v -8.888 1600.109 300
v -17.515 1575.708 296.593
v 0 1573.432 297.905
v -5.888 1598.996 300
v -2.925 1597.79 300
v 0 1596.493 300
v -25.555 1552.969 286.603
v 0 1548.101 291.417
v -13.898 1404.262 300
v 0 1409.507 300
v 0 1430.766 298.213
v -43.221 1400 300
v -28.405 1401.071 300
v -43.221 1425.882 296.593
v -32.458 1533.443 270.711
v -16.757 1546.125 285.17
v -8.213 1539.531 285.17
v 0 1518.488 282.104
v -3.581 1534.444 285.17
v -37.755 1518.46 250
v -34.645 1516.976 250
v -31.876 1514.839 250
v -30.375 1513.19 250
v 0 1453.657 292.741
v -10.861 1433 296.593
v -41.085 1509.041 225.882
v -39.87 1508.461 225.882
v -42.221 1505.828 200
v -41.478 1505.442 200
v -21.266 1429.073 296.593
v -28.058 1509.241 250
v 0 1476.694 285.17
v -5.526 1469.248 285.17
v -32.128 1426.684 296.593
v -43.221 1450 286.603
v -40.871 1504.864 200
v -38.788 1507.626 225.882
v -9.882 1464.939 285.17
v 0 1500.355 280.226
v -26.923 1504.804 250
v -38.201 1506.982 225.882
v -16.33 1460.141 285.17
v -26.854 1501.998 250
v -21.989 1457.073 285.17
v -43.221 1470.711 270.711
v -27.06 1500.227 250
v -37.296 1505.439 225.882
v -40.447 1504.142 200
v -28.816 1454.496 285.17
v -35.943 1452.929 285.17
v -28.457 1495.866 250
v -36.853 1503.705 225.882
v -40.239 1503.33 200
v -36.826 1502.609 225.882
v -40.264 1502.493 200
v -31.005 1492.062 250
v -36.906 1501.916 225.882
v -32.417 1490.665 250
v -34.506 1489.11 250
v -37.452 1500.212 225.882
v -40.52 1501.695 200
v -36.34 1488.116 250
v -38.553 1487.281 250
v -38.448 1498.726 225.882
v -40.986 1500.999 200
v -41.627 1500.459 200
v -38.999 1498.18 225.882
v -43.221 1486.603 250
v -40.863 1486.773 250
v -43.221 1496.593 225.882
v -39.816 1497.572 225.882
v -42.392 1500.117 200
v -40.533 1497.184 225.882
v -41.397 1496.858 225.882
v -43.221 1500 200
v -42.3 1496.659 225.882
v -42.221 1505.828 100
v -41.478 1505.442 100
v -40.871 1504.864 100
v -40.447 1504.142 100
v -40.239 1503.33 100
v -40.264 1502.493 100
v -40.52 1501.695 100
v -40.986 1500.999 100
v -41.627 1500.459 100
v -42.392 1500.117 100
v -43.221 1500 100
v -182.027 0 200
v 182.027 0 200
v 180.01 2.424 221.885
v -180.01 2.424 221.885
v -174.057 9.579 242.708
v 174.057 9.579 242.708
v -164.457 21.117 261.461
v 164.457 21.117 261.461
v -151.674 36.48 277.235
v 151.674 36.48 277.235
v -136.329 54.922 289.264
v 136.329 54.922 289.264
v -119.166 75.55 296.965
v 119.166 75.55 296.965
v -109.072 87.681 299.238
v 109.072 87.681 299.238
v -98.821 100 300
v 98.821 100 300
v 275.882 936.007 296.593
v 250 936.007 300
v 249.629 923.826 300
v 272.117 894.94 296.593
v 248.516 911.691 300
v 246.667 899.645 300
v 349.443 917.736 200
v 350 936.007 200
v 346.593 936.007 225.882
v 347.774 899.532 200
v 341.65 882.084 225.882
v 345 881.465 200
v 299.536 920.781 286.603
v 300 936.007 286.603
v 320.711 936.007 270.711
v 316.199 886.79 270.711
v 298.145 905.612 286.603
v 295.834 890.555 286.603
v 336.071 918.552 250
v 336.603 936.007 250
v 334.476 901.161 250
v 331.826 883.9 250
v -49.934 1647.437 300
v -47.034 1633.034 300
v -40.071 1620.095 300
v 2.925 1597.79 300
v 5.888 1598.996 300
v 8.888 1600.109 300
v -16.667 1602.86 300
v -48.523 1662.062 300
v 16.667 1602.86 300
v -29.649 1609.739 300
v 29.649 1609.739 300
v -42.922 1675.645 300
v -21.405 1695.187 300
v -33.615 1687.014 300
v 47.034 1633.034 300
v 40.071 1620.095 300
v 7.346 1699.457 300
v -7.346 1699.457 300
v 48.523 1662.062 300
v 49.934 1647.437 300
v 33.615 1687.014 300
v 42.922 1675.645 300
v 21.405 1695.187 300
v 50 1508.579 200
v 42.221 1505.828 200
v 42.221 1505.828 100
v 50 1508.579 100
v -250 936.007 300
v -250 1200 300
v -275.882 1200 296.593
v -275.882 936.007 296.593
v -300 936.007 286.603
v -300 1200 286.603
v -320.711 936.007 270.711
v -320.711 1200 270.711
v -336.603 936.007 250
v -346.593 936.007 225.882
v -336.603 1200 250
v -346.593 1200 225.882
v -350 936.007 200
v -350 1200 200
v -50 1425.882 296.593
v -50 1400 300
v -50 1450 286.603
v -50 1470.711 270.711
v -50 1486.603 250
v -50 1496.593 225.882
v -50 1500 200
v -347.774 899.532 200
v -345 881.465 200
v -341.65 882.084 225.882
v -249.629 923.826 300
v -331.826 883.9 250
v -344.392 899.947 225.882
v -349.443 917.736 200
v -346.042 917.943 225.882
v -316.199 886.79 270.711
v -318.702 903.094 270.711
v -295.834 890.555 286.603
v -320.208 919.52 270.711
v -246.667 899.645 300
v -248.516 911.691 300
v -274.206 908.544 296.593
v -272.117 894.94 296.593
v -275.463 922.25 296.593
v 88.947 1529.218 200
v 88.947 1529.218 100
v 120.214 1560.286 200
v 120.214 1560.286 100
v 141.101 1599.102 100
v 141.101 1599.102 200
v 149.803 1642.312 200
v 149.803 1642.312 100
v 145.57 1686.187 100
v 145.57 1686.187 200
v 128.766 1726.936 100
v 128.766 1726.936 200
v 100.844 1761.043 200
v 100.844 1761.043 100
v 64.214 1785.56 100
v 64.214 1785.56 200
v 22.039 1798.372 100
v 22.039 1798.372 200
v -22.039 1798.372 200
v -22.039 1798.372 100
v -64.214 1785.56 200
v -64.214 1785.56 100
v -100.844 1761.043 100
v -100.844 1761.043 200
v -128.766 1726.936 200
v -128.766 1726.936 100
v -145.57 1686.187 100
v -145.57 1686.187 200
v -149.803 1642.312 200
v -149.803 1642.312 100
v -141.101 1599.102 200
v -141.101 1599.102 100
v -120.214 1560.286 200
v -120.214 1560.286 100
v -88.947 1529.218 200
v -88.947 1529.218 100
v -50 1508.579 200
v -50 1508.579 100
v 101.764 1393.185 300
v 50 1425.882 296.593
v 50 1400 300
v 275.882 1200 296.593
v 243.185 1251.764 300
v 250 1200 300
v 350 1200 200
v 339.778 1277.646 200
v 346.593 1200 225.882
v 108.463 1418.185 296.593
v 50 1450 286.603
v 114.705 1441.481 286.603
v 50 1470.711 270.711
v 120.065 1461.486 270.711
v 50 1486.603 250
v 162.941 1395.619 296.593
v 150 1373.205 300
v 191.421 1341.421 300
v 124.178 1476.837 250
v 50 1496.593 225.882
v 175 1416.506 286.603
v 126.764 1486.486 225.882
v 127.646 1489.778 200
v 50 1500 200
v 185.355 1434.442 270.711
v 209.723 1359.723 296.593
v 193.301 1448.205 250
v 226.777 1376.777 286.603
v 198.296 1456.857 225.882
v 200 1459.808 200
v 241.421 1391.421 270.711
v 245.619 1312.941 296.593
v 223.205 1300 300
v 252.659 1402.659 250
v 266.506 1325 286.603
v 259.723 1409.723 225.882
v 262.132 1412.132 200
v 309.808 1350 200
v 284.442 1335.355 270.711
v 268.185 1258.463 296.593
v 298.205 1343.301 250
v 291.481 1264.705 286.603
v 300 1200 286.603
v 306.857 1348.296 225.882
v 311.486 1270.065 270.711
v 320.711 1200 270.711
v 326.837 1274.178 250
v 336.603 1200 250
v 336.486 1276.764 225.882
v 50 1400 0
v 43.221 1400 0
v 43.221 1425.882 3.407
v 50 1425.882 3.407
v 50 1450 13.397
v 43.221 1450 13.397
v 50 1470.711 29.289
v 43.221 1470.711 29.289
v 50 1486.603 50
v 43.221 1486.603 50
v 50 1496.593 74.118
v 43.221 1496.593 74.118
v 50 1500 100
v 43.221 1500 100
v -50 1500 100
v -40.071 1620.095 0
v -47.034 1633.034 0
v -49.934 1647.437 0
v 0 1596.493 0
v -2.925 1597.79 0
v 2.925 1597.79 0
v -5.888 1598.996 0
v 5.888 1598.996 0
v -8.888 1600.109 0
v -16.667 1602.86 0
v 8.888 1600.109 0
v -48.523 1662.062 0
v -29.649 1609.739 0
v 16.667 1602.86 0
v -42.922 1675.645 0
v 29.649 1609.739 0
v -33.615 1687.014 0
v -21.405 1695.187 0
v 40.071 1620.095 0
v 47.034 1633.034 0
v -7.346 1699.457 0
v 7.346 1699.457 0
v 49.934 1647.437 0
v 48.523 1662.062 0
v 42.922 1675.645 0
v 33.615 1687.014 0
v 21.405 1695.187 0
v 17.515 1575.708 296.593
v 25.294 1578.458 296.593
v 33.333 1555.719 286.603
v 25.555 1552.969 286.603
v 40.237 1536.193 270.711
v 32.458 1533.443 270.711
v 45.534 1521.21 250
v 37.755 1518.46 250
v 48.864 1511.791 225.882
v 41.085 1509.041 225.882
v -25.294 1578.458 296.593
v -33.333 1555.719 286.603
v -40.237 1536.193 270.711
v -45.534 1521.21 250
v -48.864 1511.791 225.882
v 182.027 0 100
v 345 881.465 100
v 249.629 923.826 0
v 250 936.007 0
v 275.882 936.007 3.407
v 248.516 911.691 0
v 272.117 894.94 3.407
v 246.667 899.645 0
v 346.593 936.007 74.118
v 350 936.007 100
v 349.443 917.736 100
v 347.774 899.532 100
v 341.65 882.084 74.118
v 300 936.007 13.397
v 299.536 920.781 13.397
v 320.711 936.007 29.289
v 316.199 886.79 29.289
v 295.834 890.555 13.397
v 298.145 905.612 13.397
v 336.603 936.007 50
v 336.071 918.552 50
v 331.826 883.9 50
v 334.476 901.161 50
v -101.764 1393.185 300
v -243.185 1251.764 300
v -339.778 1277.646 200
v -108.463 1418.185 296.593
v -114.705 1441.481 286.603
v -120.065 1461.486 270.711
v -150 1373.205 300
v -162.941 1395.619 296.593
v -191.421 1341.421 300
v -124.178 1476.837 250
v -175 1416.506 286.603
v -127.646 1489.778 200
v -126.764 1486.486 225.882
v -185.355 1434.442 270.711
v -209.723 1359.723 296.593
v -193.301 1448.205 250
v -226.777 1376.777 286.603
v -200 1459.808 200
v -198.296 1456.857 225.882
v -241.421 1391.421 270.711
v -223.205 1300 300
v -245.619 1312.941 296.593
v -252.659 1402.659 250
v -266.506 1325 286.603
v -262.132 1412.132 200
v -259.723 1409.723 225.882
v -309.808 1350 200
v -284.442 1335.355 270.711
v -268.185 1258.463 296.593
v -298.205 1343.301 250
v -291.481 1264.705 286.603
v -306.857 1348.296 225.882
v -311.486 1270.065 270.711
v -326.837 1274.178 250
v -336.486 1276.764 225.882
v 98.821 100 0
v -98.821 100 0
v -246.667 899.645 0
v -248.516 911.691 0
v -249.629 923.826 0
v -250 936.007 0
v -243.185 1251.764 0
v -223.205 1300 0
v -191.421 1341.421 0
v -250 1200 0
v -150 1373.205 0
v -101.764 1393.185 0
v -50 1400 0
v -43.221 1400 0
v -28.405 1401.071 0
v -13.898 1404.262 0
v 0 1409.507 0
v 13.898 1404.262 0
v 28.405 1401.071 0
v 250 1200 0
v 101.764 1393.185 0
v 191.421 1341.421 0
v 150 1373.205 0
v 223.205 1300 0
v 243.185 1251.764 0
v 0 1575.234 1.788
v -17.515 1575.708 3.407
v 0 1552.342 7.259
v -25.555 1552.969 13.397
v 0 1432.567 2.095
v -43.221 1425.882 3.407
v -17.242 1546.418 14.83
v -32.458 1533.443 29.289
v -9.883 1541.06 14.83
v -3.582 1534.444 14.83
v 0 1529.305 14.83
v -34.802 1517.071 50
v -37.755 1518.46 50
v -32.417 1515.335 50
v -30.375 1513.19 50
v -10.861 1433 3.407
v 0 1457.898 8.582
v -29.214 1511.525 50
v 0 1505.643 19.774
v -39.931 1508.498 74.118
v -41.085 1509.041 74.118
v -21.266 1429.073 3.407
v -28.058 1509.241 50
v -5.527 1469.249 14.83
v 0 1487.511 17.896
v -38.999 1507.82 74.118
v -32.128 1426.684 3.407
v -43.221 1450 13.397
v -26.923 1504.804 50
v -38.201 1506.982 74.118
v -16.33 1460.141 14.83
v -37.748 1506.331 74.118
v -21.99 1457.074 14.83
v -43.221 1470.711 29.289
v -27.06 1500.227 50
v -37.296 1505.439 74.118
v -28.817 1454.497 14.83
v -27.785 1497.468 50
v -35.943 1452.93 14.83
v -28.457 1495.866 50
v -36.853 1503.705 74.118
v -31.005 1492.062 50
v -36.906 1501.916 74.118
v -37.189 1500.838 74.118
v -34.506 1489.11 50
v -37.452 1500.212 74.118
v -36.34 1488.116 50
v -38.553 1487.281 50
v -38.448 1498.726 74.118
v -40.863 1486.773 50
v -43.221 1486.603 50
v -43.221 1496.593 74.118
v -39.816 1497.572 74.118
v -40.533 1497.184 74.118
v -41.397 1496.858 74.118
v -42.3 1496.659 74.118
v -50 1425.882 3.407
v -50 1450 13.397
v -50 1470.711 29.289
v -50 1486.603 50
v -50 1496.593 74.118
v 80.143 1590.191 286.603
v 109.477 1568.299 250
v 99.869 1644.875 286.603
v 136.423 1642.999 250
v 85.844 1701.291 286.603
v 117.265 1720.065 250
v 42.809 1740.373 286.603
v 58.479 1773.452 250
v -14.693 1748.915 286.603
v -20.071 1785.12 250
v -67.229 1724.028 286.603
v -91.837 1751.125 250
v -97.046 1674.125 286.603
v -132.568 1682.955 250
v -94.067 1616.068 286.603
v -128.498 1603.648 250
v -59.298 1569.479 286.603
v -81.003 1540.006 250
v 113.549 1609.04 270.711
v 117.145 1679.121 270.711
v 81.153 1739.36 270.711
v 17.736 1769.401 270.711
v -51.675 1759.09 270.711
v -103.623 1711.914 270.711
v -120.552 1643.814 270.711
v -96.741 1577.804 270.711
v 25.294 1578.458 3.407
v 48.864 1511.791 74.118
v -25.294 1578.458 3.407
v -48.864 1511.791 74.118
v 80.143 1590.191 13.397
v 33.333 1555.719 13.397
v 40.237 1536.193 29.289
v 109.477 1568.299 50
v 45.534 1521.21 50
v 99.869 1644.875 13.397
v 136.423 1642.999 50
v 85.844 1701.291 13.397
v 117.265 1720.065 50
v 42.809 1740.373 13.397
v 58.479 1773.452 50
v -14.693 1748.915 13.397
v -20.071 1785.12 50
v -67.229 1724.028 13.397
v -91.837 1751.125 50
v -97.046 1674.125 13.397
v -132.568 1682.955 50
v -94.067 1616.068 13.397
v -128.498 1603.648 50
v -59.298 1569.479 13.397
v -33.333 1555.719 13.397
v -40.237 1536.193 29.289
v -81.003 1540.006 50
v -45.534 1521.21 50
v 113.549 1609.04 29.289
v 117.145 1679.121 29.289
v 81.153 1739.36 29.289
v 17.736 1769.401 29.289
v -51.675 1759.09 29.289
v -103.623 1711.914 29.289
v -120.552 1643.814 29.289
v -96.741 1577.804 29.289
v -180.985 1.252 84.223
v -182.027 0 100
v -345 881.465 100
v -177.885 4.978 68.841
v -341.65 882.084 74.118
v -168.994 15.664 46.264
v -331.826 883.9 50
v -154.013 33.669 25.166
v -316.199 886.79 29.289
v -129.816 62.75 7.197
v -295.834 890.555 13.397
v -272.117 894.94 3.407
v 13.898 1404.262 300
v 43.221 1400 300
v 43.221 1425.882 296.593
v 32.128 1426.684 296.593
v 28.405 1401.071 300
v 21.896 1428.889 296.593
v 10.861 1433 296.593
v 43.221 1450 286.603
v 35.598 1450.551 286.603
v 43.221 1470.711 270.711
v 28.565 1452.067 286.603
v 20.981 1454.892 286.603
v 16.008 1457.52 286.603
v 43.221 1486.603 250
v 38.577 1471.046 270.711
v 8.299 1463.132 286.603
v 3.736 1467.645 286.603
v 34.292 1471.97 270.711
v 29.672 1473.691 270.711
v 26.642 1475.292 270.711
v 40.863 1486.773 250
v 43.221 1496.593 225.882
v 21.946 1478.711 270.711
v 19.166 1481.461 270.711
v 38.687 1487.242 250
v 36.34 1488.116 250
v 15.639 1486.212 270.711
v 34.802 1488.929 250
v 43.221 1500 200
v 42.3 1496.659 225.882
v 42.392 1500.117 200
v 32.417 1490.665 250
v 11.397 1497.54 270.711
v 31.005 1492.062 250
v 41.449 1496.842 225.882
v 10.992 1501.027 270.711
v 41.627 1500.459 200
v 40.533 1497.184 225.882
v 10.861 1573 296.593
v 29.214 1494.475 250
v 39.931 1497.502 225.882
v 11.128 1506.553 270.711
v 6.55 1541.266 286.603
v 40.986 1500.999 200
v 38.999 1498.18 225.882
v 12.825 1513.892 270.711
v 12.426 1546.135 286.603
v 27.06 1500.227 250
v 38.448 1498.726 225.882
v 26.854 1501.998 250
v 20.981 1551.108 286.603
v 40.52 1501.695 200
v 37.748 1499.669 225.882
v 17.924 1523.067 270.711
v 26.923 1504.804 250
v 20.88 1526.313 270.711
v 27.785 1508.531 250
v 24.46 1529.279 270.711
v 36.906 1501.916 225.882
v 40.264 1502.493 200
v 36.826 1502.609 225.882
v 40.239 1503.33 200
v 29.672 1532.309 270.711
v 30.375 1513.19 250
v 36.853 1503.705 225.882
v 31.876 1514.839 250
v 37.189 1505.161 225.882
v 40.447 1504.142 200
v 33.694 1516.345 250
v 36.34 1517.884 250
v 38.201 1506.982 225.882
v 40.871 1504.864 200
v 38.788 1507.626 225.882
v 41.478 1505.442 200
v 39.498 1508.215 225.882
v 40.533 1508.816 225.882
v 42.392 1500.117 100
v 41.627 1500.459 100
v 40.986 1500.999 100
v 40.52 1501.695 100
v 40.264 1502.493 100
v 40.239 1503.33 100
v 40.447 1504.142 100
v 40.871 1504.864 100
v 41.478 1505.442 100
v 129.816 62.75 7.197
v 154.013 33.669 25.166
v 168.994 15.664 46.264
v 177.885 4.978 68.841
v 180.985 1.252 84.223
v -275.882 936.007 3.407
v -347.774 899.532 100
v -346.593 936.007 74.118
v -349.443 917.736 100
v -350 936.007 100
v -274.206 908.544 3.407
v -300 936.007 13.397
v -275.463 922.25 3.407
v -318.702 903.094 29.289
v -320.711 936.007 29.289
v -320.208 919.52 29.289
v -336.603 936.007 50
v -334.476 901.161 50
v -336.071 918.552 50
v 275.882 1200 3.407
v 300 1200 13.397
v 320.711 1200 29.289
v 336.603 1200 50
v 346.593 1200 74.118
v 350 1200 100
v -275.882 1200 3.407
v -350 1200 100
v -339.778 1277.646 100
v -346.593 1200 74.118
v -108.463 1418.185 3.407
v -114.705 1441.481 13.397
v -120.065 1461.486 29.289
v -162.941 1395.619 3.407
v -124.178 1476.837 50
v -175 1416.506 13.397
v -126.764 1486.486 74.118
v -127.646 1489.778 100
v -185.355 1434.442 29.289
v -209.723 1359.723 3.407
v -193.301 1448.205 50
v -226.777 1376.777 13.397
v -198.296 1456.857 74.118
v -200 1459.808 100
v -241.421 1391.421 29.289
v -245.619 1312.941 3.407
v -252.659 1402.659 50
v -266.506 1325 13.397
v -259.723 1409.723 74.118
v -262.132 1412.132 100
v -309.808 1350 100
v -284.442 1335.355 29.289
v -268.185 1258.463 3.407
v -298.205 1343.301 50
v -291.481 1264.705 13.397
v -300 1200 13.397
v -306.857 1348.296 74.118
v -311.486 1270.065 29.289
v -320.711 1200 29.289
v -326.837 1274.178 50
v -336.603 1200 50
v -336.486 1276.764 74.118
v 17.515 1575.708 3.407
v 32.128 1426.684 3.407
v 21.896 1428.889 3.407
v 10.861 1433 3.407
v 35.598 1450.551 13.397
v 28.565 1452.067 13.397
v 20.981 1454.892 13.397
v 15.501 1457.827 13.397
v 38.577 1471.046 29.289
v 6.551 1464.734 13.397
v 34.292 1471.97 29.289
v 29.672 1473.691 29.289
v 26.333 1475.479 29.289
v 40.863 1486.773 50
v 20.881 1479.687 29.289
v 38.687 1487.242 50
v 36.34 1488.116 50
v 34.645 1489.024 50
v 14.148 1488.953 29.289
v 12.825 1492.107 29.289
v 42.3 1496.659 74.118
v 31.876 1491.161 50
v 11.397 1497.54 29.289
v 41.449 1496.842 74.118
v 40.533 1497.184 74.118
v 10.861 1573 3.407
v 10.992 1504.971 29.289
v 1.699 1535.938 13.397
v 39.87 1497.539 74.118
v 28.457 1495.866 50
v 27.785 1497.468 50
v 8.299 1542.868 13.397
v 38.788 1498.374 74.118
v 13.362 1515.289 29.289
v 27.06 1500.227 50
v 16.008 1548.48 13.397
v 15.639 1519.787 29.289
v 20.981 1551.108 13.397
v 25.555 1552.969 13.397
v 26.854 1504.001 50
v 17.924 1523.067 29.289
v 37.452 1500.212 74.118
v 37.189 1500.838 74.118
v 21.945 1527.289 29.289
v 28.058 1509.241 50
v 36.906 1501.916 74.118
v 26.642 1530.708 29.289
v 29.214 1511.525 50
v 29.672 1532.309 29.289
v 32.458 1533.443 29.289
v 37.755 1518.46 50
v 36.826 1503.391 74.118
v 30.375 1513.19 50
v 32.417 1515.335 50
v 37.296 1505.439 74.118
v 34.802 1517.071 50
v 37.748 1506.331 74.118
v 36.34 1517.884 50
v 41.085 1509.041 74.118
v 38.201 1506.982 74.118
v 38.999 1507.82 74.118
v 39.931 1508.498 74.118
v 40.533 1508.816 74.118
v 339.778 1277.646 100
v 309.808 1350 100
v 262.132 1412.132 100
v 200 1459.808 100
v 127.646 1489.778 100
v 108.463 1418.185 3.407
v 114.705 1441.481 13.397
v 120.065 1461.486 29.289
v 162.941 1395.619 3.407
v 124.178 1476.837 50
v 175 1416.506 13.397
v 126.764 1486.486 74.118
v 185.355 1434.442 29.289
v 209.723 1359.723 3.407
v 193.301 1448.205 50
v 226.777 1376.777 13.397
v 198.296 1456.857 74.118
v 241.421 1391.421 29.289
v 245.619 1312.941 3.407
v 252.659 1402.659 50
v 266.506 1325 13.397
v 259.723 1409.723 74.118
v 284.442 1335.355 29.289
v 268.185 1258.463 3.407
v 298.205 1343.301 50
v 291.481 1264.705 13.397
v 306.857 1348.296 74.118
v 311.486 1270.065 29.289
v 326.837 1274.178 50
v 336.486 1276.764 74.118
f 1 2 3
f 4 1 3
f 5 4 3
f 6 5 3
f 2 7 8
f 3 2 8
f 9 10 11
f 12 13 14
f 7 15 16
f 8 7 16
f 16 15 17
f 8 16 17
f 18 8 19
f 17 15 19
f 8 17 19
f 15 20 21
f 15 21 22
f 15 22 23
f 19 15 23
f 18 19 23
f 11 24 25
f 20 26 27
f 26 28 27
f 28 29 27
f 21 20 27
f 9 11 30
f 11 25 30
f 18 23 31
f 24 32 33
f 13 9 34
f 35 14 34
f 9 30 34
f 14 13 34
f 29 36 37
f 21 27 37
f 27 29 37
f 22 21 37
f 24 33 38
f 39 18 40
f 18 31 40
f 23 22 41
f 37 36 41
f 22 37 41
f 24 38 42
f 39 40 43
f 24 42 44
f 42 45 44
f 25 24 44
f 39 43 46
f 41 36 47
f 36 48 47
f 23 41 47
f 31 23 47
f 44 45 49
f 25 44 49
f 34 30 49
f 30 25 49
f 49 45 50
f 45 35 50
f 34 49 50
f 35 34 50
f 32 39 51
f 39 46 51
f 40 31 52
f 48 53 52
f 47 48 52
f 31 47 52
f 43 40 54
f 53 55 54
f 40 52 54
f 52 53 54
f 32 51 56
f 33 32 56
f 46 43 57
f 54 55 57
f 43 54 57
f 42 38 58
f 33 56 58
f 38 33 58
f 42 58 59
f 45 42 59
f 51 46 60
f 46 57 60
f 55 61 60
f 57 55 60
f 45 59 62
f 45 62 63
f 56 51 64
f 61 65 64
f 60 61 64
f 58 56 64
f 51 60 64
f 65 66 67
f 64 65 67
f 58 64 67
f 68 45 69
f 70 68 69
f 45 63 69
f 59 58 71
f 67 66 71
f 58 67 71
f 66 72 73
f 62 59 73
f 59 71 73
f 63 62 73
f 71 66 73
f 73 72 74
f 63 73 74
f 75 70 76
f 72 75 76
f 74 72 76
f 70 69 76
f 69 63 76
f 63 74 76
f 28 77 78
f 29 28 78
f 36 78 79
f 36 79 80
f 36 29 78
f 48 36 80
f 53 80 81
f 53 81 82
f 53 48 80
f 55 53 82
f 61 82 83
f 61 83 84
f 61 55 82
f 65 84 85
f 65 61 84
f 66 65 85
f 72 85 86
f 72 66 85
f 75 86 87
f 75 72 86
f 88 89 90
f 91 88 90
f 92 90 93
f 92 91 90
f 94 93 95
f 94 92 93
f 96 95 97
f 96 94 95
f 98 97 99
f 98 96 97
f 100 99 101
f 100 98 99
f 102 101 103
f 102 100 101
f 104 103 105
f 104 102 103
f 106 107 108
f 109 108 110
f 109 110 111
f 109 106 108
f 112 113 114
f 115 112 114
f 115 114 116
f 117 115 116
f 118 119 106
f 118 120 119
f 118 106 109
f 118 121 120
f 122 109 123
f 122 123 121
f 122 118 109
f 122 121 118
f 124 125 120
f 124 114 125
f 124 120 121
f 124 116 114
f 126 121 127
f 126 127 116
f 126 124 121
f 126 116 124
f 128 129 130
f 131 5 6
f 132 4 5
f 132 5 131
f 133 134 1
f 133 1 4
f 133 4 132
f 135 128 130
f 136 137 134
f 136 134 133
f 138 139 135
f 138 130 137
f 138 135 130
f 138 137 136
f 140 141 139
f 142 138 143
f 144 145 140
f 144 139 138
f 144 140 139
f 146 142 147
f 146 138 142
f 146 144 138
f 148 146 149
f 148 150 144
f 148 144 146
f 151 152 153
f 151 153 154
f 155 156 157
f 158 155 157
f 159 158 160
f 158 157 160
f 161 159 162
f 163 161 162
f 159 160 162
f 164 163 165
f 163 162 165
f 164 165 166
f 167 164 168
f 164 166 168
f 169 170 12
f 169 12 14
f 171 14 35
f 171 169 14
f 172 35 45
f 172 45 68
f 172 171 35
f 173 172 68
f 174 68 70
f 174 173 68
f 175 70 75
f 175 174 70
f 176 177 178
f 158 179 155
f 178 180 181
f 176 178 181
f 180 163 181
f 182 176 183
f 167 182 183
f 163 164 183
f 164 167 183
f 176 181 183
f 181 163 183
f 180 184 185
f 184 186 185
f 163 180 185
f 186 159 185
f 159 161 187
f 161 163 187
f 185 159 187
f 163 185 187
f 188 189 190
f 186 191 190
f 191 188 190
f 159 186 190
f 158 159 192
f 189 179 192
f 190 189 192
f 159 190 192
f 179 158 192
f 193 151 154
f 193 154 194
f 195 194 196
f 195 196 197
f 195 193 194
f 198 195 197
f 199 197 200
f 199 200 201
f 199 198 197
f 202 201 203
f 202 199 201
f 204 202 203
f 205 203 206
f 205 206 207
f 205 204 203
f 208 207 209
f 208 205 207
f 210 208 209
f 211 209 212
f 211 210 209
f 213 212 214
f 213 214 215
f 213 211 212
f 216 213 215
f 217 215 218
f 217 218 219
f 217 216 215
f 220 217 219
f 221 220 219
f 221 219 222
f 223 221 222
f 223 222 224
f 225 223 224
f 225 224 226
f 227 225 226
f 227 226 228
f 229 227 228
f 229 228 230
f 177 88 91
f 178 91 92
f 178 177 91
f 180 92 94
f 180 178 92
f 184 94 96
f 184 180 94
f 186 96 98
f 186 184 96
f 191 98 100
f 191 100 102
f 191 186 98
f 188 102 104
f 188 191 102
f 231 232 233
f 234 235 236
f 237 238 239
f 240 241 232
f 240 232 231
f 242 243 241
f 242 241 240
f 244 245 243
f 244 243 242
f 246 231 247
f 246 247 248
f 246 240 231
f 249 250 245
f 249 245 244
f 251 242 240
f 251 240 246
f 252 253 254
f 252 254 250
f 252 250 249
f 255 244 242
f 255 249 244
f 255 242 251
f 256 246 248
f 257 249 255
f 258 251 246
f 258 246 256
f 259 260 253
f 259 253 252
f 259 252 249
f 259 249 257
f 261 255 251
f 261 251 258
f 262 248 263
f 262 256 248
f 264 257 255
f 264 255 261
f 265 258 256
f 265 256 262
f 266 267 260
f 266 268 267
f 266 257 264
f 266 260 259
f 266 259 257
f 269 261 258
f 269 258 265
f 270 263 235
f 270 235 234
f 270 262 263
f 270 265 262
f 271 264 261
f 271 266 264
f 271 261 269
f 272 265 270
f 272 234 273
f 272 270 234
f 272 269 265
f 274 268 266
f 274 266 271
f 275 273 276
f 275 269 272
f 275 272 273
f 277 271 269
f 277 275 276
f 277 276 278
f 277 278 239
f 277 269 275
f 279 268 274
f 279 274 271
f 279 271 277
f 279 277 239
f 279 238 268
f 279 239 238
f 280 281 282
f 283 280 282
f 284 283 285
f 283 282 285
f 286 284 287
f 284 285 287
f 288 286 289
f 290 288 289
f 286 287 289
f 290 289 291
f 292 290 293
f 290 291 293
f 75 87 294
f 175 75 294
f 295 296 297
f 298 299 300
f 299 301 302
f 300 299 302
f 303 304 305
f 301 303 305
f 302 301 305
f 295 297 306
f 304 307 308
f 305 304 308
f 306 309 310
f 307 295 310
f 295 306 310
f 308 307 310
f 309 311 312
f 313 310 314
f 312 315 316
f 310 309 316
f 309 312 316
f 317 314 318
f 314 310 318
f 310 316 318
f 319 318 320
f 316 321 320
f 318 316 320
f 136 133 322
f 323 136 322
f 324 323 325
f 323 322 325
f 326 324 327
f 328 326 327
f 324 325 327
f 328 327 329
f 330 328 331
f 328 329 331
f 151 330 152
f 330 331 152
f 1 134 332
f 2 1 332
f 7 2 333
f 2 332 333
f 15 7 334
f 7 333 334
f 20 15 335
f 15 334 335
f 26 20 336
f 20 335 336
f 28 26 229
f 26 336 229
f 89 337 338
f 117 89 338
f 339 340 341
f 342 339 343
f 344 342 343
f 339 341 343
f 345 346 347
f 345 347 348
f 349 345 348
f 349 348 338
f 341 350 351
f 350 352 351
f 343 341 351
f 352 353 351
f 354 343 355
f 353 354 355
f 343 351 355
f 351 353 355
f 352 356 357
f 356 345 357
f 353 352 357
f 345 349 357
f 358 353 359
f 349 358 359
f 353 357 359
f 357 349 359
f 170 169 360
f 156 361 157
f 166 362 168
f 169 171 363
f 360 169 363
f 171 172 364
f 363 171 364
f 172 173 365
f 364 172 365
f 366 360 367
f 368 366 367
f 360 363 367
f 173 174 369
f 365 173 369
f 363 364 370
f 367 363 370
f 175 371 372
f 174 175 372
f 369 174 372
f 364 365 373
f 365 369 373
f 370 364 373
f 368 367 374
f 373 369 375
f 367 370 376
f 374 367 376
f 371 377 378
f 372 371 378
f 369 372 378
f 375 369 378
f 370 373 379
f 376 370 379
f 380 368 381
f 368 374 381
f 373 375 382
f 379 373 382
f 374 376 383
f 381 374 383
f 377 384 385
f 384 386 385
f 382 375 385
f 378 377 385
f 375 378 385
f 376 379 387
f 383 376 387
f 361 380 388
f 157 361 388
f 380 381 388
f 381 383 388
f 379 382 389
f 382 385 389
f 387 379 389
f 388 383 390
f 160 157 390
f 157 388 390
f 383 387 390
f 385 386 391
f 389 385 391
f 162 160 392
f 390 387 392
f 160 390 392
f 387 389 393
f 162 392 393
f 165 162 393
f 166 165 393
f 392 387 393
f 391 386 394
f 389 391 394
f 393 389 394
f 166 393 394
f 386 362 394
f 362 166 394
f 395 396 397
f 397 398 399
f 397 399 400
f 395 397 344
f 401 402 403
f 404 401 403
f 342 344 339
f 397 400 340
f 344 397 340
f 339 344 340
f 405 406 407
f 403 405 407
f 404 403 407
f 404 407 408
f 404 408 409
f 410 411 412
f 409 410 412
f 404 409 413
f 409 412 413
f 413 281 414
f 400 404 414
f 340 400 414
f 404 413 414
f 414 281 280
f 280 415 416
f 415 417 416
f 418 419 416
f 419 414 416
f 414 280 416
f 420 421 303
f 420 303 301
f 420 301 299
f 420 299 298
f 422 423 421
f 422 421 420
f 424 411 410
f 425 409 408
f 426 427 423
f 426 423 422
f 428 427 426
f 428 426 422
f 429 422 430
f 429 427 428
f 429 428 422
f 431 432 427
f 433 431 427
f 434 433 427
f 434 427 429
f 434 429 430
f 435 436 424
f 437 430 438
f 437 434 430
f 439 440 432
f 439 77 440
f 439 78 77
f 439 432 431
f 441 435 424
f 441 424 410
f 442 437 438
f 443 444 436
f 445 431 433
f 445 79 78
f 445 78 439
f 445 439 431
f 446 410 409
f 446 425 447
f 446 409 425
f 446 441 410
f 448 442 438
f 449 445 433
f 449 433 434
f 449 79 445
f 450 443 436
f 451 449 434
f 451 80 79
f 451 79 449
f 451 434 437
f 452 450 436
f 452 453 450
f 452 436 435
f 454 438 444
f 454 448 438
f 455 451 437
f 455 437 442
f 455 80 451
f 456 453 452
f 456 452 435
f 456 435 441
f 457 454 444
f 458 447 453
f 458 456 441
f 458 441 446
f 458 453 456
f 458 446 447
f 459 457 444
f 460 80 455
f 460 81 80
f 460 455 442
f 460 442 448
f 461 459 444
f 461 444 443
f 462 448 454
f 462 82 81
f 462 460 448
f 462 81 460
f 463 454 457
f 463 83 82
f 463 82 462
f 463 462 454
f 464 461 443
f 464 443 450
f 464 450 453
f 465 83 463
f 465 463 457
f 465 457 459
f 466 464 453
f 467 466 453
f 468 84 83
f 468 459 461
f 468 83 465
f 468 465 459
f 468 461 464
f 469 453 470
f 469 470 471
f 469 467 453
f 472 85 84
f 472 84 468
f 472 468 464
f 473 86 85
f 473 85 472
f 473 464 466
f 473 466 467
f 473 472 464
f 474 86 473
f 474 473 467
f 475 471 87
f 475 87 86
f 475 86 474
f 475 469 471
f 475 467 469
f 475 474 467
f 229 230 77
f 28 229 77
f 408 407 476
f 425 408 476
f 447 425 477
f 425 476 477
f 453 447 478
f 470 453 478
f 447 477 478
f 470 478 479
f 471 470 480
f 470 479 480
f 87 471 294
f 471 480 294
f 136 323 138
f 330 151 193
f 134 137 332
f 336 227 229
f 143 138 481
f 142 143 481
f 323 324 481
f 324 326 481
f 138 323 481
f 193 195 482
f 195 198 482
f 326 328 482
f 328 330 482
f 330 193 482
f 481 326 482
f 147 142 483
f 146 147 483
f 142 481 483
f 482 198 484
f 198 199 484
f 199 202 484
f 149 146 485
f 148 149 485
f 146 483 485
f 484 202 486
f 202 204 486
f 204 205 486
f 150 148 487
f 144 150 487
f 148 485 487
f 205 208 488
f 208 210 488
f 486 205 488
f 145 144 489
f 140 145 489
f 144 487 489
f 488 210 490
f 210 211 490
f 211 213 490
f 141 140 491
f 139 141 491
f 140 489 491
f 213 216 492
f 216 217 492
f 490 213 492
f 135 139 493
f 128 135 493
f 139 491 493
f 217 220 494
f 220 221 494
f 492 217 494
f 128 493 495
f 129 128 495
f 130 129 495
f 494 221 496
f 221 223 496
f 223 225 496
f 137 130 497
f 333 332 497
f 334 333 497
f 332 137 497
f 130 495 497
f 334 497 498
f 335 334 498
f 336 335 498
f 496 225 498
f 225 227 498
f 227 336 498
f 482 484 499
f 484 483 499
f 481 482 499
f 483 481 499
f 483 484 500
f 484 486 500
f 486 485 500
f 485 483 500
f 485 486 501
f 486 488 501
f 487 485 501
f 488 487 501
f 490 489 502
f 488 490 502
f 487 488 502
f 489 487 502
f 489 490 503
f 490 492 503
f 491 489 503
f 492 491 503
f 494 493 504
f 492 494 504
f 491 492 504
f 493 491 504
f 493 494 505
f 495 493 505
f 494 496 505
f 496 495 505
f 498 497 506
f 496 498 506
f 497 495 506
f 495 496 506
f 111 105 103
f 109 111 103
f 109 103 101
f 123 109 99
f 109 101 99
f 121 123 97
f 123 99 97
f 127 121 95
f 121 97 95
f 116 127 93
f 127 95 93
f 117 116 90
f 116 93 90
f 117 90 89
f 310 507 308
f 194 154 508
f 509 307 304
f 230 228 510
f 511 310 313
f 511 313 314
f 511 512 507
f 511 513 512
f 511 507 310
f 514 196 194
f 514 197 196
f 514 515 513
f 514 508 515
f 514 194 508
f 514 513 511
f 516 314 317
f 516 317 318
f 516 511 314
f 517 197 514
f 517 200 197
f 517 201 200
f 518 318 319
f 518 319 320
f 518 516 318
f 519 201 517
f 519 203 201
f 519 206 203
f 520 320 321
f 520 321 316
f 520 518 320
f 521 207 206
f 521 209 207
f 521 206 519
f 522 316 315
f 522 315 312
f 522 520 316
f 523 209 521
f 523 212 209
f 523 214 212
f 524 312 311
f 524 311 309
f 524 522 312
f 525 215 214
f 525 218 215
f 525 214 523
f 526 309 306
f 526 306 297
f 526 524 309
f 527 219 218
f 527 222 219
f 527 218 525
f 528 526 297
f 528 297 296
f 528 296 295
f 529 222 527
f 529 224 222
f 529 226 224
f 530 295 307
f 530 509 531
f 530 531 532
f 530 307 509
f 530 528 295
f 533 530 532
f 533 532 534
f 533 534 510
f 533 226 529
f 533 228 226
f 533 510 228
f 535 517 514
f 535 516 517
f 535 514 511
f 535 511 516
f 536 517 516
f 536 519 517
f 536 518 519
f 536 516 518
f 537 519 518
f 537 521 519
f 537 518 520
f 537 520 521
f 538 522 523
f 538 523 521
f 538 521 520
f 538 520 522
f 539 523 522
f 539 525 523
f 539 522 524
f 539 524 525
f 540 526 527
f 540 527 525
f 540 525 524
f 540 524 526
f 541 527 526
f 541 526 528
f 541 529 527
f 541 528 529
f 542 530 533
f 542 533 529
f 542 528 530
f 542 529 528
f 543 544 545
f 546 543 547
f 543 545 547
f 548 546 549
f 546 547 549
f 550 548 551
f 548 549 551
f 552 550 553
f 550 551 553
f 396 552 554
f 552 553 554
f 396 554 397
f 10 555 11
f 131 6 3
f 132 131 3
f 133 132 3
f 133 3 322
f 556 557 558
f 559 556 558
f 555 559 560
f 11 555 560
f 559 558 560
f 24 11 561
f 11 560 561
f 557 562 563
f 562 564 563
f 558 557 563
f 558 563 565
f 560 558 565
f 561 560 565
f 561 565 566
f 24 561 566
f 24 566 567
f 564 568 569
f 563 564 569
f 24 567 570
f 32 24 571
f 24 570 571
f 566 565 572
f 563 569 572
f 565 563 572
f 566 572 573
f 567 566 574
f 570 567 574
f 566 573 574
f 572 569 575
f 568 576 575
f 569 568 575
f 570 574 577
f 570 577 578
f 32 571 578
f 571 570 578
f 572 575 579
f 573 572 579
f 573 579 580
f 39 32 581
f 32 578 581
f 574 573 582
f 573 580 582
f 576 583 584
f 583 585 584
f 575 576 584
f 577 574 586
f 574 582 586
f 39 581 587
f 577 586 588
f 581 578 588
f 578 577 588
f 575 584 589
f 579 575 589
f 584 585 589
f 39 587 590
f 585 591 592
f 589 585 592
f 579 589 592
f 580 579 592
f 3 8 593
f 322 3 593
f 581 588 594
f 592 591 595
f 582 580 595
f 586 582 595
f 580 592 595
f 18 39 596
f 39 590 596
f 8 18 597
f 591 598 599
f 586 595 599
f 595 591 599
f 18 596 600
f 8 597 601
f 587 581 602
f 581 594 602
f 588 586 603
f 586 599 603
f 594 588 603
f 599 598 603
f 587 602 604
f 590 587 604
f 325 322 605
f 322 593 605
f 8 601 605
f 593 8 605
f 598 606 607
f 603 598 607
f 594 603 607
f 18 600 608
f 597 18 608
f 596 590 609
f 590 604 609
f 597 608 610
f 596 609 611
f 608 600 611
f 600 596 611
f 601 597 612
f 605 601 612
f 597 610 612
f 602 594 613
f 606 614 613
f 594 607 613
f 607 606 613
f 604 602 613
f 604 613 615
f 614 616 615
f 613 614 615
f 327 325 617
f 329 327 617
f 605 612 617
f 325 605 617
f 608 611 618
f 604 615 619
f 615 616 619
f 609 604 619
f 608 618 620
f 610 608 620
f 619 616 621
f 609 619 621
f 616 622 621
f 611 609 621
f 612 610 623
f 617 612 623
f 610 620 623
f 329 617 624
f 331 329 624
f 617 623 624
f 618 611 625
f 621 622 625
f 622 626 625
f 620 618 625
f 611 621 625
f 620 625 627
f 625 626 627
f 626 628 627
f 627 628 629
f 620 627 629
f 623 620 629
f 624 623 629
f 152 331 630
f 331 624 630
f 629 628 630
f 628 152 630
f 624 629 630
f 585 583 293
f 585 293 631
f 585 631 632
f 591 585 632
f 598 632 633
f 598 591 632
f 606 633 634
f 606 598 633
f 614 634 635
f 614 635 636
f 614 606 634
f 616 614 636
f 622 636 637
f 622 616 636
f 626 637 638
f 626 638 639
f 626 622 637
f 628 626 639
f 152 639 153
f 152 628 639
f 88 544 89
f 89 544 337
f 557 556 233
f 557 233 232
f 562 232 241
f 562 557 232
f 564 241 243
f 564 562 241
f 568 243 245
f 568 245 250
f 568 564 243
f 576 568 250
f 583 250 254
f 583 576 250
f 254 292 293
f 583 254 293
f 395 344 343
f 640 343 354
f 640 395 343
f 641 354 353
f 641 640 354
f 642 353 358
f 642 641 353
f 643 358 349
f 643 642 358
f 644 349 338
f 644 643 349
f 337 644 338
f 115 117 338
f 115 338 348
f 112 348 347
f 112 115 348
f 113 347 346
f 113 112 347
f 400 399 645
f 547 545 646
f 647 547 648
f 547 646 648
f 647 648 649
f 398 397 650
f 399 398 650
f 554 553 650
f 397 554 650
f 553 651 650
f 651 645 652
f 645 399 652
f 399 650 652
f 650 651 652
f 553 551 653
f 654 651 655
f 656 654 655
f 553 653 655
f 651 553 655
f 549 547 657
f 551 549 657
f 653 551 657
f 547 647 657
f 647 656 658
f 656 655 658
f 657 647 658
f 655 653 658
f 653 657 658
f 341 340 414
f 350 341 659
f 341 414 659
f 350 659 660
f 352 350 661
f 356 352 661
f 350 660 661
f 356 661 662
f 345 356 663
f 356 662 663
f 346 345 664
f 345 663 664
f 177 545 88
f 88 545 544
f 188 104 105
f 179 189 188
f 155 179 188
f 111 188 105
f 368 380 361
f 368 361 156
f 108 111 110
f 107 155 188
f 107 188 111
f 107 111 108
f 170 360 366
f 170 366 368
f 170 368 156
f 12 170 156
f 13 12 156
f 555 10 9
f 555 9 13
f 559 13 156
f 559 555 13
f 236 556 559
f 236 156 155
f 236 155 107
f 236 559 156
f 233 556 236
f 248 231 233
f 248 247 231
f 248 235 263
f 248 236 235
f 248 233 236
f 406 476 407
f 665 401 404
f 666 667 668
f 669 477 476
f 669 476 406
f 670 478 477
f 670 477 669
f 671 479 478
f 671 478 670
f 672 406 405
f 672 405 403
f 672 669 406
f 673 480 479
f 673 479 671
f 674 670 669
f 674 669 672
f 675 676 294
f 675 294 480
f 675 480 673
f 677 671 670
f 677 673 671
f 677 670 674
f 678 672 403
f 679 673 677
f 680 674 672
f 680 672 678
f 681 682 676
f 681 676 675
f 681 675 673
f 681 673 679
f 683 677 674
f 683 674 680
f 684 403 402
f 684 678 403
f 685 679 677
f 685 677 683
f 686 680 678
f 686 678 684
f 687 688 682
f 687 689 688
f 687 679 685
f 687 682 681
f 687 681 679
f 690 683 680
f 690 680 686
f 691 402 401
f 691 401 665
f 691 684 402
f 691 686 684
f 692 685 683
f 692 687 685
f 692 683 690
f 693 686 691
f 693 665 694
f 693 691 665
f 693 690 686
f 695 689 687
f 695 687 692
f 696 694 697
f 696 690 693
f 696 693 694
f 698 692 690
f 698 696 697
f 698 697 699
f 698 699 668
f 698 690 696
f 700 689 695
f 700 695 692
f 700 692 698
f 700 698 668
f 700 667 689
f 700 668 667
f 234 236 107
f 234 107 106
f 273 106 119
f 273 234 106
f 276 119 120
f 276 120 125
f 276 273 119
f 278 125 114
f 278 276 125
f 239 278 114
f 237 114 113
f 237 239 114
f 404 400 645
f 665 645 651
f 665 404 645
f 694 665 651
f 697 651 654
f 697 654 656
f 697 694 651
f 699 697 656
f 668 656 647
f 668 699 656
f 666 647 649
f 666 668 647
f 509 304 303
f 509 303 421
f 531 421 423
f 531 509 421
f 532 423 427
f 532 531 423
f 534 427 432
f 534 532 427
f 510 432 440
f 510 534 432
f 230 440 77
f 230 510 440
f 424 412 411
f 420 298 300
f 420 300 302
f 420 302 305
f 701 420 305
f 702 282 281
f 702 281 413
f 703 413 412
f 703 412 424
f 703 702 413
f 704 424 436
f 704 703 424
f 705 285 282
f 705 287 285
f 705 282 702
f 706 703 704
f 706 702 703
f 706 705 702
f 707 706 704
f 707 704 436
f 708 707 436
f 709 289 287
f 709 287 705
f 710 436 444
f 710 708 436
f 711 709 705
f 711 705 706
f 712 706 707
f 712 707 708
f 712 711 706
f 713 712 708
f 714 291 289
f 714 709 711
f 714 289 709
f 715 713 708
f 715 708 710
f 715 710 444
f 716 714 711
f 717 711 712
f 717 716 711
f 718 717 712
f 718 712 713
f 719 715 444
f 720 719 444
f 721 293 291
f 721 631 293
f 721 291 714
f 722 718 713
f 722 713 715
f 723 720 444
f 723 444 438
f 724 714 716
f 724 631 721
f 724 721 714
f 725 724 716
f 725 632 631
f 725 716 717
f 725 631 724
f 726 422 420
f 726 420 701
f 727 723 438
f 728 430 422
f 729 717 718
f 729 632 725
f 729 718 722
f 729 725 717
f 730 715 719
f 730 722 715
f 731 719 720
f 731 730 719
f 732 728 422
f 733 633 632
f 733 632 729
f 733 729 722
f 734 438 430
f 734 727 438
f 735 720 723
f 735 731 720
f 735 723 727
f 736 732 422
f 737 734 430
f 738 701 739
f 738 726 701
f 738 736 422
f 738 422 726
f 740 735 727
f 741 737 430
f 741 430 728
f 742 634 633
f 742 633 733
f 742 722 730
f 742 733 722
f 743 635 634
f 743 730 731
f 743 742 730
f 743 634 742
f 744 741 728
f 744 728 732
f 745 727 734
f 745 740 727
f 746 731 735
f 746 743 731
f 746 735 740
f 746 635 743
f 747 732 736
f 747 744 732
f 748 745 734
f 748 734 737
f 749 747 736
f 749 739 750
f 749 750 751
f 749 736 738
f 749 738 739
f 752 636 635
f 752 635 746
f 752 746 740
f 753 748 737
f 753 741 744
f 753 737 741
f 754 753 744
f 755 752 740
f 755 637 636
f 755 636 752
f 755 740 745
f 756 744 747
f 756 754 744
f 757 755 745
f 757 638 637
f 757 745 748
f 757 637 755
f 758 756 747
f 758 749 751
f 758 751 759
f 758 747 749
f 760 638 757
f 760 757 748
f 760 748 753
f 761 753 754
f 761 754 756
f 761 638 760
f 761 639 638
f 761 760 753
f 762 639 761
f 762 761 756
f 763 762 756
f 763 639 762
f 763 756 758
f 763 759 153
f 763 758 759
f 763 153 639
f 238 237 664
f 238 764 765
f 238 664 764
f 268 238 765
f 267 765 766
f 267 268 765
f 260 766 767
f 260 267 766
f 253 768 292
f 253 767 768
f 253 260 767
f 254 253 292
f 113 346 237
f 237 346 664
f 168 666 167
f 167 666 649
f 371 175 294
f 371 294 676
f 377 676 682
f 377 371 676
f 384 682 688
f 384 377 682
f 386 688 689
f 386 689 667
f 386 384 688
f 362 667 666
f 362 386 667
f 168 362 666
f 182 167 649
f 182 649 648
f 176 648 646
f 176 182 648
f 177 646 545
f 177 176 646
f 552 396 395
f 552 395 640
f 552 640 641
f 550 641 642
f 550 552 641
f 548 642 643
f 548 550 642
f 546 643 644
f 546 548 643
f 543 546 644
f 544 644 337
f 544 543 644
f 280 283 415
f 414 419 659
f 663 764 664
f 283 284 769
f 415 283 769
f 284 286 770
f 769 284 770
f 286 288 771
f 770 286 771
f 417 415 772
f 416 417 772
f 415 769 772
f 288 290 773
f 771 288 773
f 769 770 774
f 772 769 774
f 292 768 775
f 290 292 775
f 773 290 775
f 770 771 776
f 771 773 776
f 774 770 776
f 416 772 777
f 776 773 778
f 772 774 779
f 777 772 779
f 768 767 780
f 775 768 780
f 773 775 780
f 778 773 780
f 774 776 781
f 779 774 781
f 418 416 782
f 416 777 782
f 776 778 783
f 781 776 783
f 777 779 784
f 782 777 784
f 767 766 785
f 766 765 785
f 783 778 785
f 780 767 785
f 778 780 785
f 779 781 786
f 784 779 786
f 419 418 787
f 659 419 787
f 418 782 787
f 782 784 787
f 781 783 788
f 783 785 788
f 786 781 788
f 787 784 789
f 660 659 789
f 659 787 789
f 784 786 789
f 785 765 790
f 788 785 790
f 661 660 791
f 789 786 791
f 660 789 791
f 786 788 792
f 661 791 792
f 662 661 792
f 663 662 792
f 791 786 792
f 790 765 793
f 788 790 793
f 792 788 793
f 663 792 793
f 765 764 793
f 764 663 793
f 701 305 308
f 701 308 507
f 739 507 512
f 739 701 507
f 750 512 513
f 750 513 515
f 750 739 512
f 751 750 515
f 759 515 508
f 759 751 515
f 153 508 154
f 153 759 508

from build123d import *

# Parameters (mm, degrees)
F1_DEPTH     = 300
F2_R         = 300
F4_DEPTH     = 300
F5_T1_DEPTH  = 1146.4039437128
F5_T3_DEPTH  = 864.0548707486
F5_T5_DEPTH  = 1146.4039437128
F5_T7_DEPTH  = 263.9931695697
F5_T9_DEPTH  = 6.7787873377
F5_T11_DEPTH = 8.2506499138
F5_T13_DEPTH = 8.2506499138
F5_T15_DEPTH = 6.7787873377
F5_T18_ANGLE = 10.4750499308
F5_T20_ANGLE = 90
F5_T22_ANGLE = 160.5287793655
F5_T24_ANGLE = 321.057558731
F5_T26_ANGLE = 160.5287793655
F5_T28_ANGLE = 90
F5_T30_ANGLE = 10.4750499308
F5_T32_ANGLE = 10.4750499308
F5_T34_ANGLE = 90
F5_T36_ANGLE = 160.5287793655
F5_T38_ANGLE = 321.057558731
F5_T40_ANGLE = 160.5287793655
F5_T42_ANGLE = 90
F5_T44_ANGLE = 10.4750499308


# Not quite as in the source:
# - a fillet or chamfer that OpenCascade refuses, or shapes differently, is made with other operations: its cross-section is extruded or revolved along the edge and cut away or added


with BuildPart() as f1:
    # F0 (on Top) → F1 (new body)
    with BuildSketch(Plane.XY):
        Polygon((-182.0274353743, 0), (0, 0), (182.0274353743, 0), (350, 908.5065722466), (350, 1500), (-350, 1500), (-350, 908.5065722466), align=None)
    extrude(amount=F1_DEPTH)

    # F2
    f2_edges = [f1.edges().sort_by_distance(p)[0] for p in [
        (350, 1500, 150),
        (-350, 1500, 150),
        (-350, 908.506572, 150),
        (350, 908.506572, 150),
    ]]
    fillet(f2_edges, radius=F2_R)

    # F3 (on face) → F4 (join, through all)
    with BuildSketch(Plane.XY.offset(300)):
        with BuildLine():
            ThreePointArc((50, 1508.5786437627), (122.4744871392, 1563.3974596216), (150, 1650))
            ThreePointArc((150, 1650), (-86.6025403784, 1772.4744871392), (-50, 1508.5786437627))
            ThreePointArc((-50, 1508.5786437627), (0, 1500), (50, 1508.5786437627))
        make_face()
        with BuildLine():
            Line((42.2212126623, 1505.8284271247), (50, 1508.5786437627))
            ThreePointArc((50, 1508.5786437627), (25.3652965741, 1502.1602160117), (-4.764e-07, 1500))
            Line((-4.764e-07, 1500), (43.2212126623, 1500))
            ThreePointArc((43.2212126623, 1500), (40.2644169833, 1502.4926940638), (42.2212126623, 1505.8284271247))
        make_face()
        with BuildLine():
            ThreePointArc((-4.764e-07, 1500), (-25.3652970436, 1502.1602160923), (-50, 1508.5786437627))
            Line((-50, 1508.5786437627), (-42.2212126623, 1505.8284271247))
            ThreePointArc((-42.2212126623, 1505.8284271247), (-40.2644169834, 1502.4926940638), (-43.2212126623, 1500))
            Line((-43.2212126623, 1500), (-4.764e-07, 1500))
        make_face()
    extrude(amount=-F4_DEPTH)

    # F5: fillet of radius 100 on 32 edges, made by hand

    # F5_s2 → F5_t1 (cut)
    with BuildSketch(Plane(origin=(-168.9895340673, 914.0070146762, 0), x_dir=(0, 0, 1), z_dir=(0.1818073392, -0.9833341708, 0))):
        with BuildLine():
            ThreePointArc((100, 178.9937972219), (29.2893218813, 149.7044753406), (0, 78.9937972219))
            Line((0, 78.9937972219), (0, 178.9937972219))
            Line((0, 178.9937972219), (100, 178.9937972219))
        make_face()
        with BuildLine():
            ThreePointArc((200, 178.9937972219), (270.7106781187, 149.7044753406), (300, 78.9937972219))
            Line((300, 78.9937972219), (300, 178.9937972219))
            Line((300, 178.9937972219), (200, 178.9937972219))
        make_face()
    extrude(amount=F5_T1_DEPTH, mode=Mode.SUBTRACT)

    # F5_s4 → F5_t3 (cut)
    with BuildSketch(Plane.YZ.offset(-432.0274353743)):
        with BuildLine():
            ThreePointArc((100, 0), (29.2893218813, 29.2893218813), (0, 100))
            Line((0, 100), (0, 0))
            Line((0, 0), (100, 0))
        make_face()
        with BuildLine():
            ThreePointArc((0, 200), (29.2893218813, 270.7106781187), (100, 300))
            Line((100, 300), (0, 300))
            Line((0, 300), (0, 200))
        make_face()
    extrude(amount=F5_T3_DEPTH, mode=Mode.SUBTRACT)

    # F5_s6 → F5_t5 (cut)
    with BuildSketch(Plane(origin=(-39.4351165914, -213.2911566867, 0), x_dir=(0, 0, 1), z_dir=(0.1818073392, 0.9833341708, 0))):
        with BuildLine():
            ThreePointArc((0, 78.9937972219), (29.2893218813, 149.7044753406), (100, 178.9937972219))
            Line((100, 178.9937972219), (0, 178.9937972219))
            Line((0, 178.9937972219), (0, 78.9937972219))
        make_face()
        with BuildLine():
            ThreePointArc((300, 78.9937972219), (270.7106781187, 149.7044753406), (200, 178.9937972219))
            Line((200, 178.9937972219), (300, 178.9937972219))
            Line((300, 178.9937972219), (300, 78.9937972219))
        make_face()
    extrude(amount=F5_T5_DEPTH, mode=Mode.SUBTRACT)

    # F5_s8 → F5_t7 (cut)
    with BuildSketch(Plane.XZ.offset(-1200)):
        with BuildLine():
            ThreePointArc((250, 0), (320.7106781187, 29.2893218813), (350, 100))
            Line((350, 100), (350, 0))
            Line((350, 0), (250, 0))
        make_face()
        with BuildLine():
            ThreePointArc((-250, 0), (-320.7106781187, 29.2893218813), (-350, 100))
            Line((-350, 100), (-350, 0))
            Line((-350, 0), (-250, 0))
        make_face()
        with BuildLine():
            ThreePointArc((250, 300), (320.7106781187, 270.7106781187), (350, 200))
            Line((350, 200), (350, 300))
            Line((350, 300), (250, 300))
        make_face()
        with BuildLine():
            ThreePointArc((-250, 300), (-320.7106781187, 270.7106781187), (-350, 200))
            Line((-350, 200), (-350, 300))
            Line((-350, 300), (-250, 300))
        make_face()
    extrude(amount=F5_T7_DEPTH, mode=Mode.SUBTRACT)

    # F5_s10 → F5_t9 (cut)
    with BuildSketch(Plane.YZ.offset(43.2212126623)):
        with BuildLine():
            ThreePointArc((1400, 0), (1470.7106781187, 29.2893218813), (1500, 100))
            Line((1500, 100), (1500, 0))
            Line((1500, 0), (1400, 0))
        make_face()
        with BuildLine():
            ThreePointArc((1400, 300), (1470.7106781187, 270.7106781187), (1500, 200))
            Line((1500, 200), (1500, 300))
            Line((1500, 300), (1400, 300))
        make_face()
    extrude(amount=F5_T9_DEPTH, mode=Mode.SUBTRACT)

    # F5_s12 → F5_t11 (cut)
    with BuildSketch(Plane(origin=(510.7661855325, 180.5831166954, 0), x_dir=(0, 0, 1), z_dir=(0.9428090416, 0.3333333333, 0))):
        with BuildLine():
            ThreePointArc((0, -1505.6349186104), (29.2893218813, -1434.9242404917), (100, -1405.6349186104))
            Line((100, -1405.6349186104), (0, -1405.6349186104))
            Line((0, -1405.6349186104), (0, -1505.6349186104))
        make_face()
        with BuildLine():
            ThreePointArc((300, -1505.6349186104), (270.7106781187, -1434.9242404917), (200, -1405.6349186104))
            Line((200, -1405.6349186104), (300, -1405.6349186104))
            Line((300, -1405.6349186104), (300, -1505.6349186104))
        make_face()
    extrude(amount=F5_T11_DEPTH, mode=Mode.SUBTRACT)

    # F5_s14 → F5_t13 (cut)
    with BuildSketch(Plane(origin=(-518.5449728702, 183.3333333334, 0), x_dir=(0, 0, 1), z_dir=(0.9428090416, -0.3333333333, 0))):
        with BuildLine():
            ThreePointArc((0, -1505.6349186104), (29.2893218813, -1434.9242404917), (100, -1405.6349186104))
            Line((100, -1405.6349186104), (0, -1405.6349186104))
            Line((0, -1405.6349186104), (0, -1505.6349186104))
        make_face()
        with BuildLine():
            ThreePointArc((300, -1505.6349186104), (270.7106781187, -1434.9242404917), (200, -1405.6349186104))
            Line((200, -1405.6349186104), (300, -1405.6349186104))
            Line((300, -1405.6349186104), (300, -1505.6349186104))
        make_face()
    extrude(amount=F5_T13_DEPTH, mode=Mode.SUBTRACT)

    # F5_s16 → F5_t15 (cut)
    with BuildSketch(Plane.YZ.offset(-50)):
        with BuildLine():
            ThreePointArc((1400, 0), (1470.7106781187, 29.2893218813), (1500, 100))
            Line((1500, 100), (1500, 0))
            Line((1500, 0), (1400, 0))
        make_face()
        with BuildLine():
            ThreePointArc((1400, 300), (1470.7106781187, 270.7106781187), (1500, 200))
            Line((1500, 200), (1500, 300))
            Line((1500, 300), (1400, 300))
        make_face()
    extrude(amount=F5_T15_DEPTH, mode=Mode.SUBTRACT)

    # F5_s17 → F5_t18 (revolve, cut)
    with BuildSketch(Plane.XZ.offset(-936.0068304303)):
        with BuildLine():
            ThreePointArc((250, 0), (320.7106781187, 29.2893218813), (350, 100))
            Line((350, 100), (350, 0))
            Line((350, 0), (250, 0))
        make_face()
    revolve(axis=Axis((50, 936.0068304303, 0), (0, 0, -1)), revolution_arc=F5_T18_ANGLE, mode=Mode.SUBTRACT)

    # F5_s19 → F5_t20 (revolve, cut)
    with BuildSketch(Plane.YZ.offset(50)):
        with BuildLine():
            ThreePointArc((1400, 0), (1470.7106781187, 29.2893218813), (1500, 100))
            Line((1500, 100), (1500, 0))
            Line((1500, 0), (1400, 0))
        make_face()
    revolve(axis=Axis((50, 1200, 0), (0, 0, -1)), revolution_arc=F5_T20_ANGLE, mode=Mode.SUBTRACT)

    # F5_s21 → F5_t22 (revolve, cut)
    with BuildSketch(Plane.YZ.offset(43.2212126623)):
        with BuildLine():
            ThreePointArc((1400, 0), (1470.7106781187, 29.2893218813), (1500, 100))
            Line((1500, 100), (1500, 0))
            Line((1500, 0), (1400, 0))
        make_face()
    revolve(axis=Axis((43.2212126623, 1503, 0), (0, 0, -1)), revolution_arc=F5_T22_ANGLE, mode=Mode.SUBTRACT)

    # F5_s23 → F5_t24 (revolve, cut)
    with BuildSketch(Plane(origin=(518.5449728701, 183.3333333333, 0), x_dir=(0, 0, 1), z_dir=(-0.9428090416, -0.3333333333, 0))):
        with BuildLine():
            ThreePointArc((0, 1505.6349186104), (29.2893218813, 1434.9242404917), (100, 1405.6349186104))
            Line((100, 1405.6349186104), (0, 1405.6349186104))
            Line((0, 1405.6349186104), (0, 1505.6349186104))
        make_face()
    revolve(axis=Axis((0, 1650, 0), (0, 0, 1)), revolution_arc=F5_T24_ANGLE, mode=Mode.SUBTRACT)

    # F5_s25 → F5_t26 (revolve, cut)
    with BuildSketch(Plane(origin=(-510.7661855325, 180.5831166954, 0), x_dir=(0, 0, 1), z_dir=(-0.9428090416, 0.3333333333, 0))):
        with BuildLine():
            ThreePointArc((0, 1505.6349186104), (29.2893218813, 1434.9242404917), (100, 1405.6349186104))
            Line((100, 1405.6349186104), (0, 1405.6349186104))
            Line((0, 1405.6349186104), (0, 1505.6349186104))
        make_face()
    revolve(axis=Axis((-43.2212126623, 1503, 0), (0, 0, -1)), revolution_arc=F5_T26_ANGLE, mode=Mode.SUBTRACT)

    # F5_s27 → F5_t28 (revolve, cut)
    with BuildSketch(Plane.YZ.offset(-50)):
        with BuildLine():
            ThreePointArc((1400, 0), (1470.7106781187, 29.2893218813), (1500, 100))
            Line((1500, 100), (1500, 0))
            Line((1500, 0), (1400, 0))
        make_face()
    revolve(axis=Axis((-50, 1200, 0), (0, 0, 1)), revolution_arc=F5_T28_ANGLE, mode=Mode.SUBTRACT)

    # F5_s29 → F5_t30 (revolve, cut)
    with BuildSketch(Plane(origin=(-168.9895340673, 914.0070146762, 0), x_dir=(0, 0, 1), z_dir=(0.1818073392, -0.9833341708, 0))):
        with BuildLine():
            ThreePointArc((0, 78.9937972219), (29.2893218813, 149.7044753406), (100, 178.9937972219))
            Line((100, 178.9937972219), (0, 178.9937972219))
            Line((0, 178.9937972219), (0, 78.9937972219))
        make_face()
    revolve(axis=Axis((-50, 936.0068304303, 0), (0, 0, -1)), revolution_arc=F5_T30_ANGLE, mode=Mode.SUBTRACT)

    # F5_s31 → F5_t32 (revolve, cut)
    with BuildSketch(Plane.XZ.offset(-936.0068304303)):
        with BuildLine():
            ThreePointArc((250, 300), (320.7106781187, 270.7106781187), (350, 200))
            Line((350, 200), (350, 300))
            Line((350, 300), (250, 300))
        make_face()
    revolve(axis=Axis((50, 936.0068304303, 300), (0, 0, -1)), revolution_arc=F5_T32_ANGLE, mode=Mode.SUBTRACT)

    # F5_s33 → F5_t34 (revolve, cut)
    with BuildSketch(Plane.YZ.offset(50)):
        with BuildLine():
            ThreePointArc((1400, 300), (1470.7106781187, 270.7106781187), (1500, 200))
            Line((1500, 200), (1500, 300))
            Line((1500, 300), (1400, 300))
        make_face()
    revolve(axis=Axis((50, 1200, 300), (0, 0, -1)), revolution_arc=F5_T34_ANGLE, mode=Mode.SUBTRACT)

    # F5_s35 → F5_t36 (revolve, cut)
    with BuildSketch(Plane.YZ.offset(43.2212126623)):
        with BuildLine():
            ThreePointArc((1400, 300), (1470.7106781187, 270.7106781187), (1500, 200))
            Line((1500, 200), (1500, 300))
            Line((1500, 300), (1400, 300))
        make_face()
    revolve(axis=Axis((43.2212126623, 1503, 300), (0, 0, -1)), revolution_arc=F5_T36_ANGLE, mode=Mode.SUBTRACT)

    # F5_s37 → F5_t38 (revolve, cut)
    with BuildSketch(Plane(origin=(518.5449728701, 183.3333333333, 0), x_dir=(0, 0, 1), z_dir=(-0.9428090416, -0.3333333333, 0))):
        with BuildLine():
            ThreePointArc((300, 1505.6349186104), (270.7106781187, 1434.9242404917), (200, 1405.6349186104))
            Line((200, 1405.6349186104), (300, 1405.6349186104))
            Line((300, 1405.6349186104), (300, 1505.6349186104))
        make_face()
    revolve(axis=Axis((0, 1650, 300), (0, 0, 1)), revolution_arc=F5_T38_ANGLE, mode=Mode.SUBTRACT)

    # F5_s39 → F5_t40 (revolve, cut)
    with BuildSketch(Plane(origin=(-510.7661855325, 180.5831166954, 0), x_dir=(0, 0, 1), z_dir=(-0.9428090416, 0.3333333333, 0))):
        with BuildLine():
            ThreePointArc((300, 1505.6349186104), (270.7106781187, 1434.9242404917), (200, 1405.6349186104))
            Line((200, 1405.6349186104), (300, 1405.6349186104))
            Line((300, 1405.6349186104), (300, 1505.6349186104))
        make_face()
    revolve(axis=Axis((-43.2212126623, 1503, 300), (0, 0, -1)), revolution_arc=F5_T40_ANGLE, mode=Mode.SUBTRACT)

    # F5_s41 → F5_t42 (revolve, cut)
    with BuildSketch(Plane.YZ.offset(-50)):
        with BuildLine():
            ThreePointArc((1400, 300), (1470.7106781187, 270.7106781187), (1500, 200))
            Line((1500, 200), (1500, 300))
            Line((1500, 300), (1400, 300))
        make_face()
    revolve(axis=Axis((-50, 1200, 300), (0, 0, 1)), revolution_arc=F5_T42_ANGLE, mode=Mode.SUBTRACT)

    # F5_s43 → F5_t44 (revolve, cut)
    with BuildSketch(Plane(origin=(-168.9895340673, 914.0070146762, 0), x_dir=(0, 0, 1), z_dir=(0.1818073392, -0.9833341708, 0))):
        with BuildLine():
            ThreePointArc((200, 178.9937972219), (270.7106781187, 149.7044753406), (300, 78.9937972219))
            Line((300, 78.9937972219), (300, 178.9937972219))
            Line((300, 178.9937972219), (200, 178.9937972219))
        make_face()
    revolve(axis=Axis((-50, 936.0068304303, 300), (0, 0, -1)), revolution_arc=F5_T44_ANGLE, mode=Mode.SUBTRACT)


solid = f1.part
